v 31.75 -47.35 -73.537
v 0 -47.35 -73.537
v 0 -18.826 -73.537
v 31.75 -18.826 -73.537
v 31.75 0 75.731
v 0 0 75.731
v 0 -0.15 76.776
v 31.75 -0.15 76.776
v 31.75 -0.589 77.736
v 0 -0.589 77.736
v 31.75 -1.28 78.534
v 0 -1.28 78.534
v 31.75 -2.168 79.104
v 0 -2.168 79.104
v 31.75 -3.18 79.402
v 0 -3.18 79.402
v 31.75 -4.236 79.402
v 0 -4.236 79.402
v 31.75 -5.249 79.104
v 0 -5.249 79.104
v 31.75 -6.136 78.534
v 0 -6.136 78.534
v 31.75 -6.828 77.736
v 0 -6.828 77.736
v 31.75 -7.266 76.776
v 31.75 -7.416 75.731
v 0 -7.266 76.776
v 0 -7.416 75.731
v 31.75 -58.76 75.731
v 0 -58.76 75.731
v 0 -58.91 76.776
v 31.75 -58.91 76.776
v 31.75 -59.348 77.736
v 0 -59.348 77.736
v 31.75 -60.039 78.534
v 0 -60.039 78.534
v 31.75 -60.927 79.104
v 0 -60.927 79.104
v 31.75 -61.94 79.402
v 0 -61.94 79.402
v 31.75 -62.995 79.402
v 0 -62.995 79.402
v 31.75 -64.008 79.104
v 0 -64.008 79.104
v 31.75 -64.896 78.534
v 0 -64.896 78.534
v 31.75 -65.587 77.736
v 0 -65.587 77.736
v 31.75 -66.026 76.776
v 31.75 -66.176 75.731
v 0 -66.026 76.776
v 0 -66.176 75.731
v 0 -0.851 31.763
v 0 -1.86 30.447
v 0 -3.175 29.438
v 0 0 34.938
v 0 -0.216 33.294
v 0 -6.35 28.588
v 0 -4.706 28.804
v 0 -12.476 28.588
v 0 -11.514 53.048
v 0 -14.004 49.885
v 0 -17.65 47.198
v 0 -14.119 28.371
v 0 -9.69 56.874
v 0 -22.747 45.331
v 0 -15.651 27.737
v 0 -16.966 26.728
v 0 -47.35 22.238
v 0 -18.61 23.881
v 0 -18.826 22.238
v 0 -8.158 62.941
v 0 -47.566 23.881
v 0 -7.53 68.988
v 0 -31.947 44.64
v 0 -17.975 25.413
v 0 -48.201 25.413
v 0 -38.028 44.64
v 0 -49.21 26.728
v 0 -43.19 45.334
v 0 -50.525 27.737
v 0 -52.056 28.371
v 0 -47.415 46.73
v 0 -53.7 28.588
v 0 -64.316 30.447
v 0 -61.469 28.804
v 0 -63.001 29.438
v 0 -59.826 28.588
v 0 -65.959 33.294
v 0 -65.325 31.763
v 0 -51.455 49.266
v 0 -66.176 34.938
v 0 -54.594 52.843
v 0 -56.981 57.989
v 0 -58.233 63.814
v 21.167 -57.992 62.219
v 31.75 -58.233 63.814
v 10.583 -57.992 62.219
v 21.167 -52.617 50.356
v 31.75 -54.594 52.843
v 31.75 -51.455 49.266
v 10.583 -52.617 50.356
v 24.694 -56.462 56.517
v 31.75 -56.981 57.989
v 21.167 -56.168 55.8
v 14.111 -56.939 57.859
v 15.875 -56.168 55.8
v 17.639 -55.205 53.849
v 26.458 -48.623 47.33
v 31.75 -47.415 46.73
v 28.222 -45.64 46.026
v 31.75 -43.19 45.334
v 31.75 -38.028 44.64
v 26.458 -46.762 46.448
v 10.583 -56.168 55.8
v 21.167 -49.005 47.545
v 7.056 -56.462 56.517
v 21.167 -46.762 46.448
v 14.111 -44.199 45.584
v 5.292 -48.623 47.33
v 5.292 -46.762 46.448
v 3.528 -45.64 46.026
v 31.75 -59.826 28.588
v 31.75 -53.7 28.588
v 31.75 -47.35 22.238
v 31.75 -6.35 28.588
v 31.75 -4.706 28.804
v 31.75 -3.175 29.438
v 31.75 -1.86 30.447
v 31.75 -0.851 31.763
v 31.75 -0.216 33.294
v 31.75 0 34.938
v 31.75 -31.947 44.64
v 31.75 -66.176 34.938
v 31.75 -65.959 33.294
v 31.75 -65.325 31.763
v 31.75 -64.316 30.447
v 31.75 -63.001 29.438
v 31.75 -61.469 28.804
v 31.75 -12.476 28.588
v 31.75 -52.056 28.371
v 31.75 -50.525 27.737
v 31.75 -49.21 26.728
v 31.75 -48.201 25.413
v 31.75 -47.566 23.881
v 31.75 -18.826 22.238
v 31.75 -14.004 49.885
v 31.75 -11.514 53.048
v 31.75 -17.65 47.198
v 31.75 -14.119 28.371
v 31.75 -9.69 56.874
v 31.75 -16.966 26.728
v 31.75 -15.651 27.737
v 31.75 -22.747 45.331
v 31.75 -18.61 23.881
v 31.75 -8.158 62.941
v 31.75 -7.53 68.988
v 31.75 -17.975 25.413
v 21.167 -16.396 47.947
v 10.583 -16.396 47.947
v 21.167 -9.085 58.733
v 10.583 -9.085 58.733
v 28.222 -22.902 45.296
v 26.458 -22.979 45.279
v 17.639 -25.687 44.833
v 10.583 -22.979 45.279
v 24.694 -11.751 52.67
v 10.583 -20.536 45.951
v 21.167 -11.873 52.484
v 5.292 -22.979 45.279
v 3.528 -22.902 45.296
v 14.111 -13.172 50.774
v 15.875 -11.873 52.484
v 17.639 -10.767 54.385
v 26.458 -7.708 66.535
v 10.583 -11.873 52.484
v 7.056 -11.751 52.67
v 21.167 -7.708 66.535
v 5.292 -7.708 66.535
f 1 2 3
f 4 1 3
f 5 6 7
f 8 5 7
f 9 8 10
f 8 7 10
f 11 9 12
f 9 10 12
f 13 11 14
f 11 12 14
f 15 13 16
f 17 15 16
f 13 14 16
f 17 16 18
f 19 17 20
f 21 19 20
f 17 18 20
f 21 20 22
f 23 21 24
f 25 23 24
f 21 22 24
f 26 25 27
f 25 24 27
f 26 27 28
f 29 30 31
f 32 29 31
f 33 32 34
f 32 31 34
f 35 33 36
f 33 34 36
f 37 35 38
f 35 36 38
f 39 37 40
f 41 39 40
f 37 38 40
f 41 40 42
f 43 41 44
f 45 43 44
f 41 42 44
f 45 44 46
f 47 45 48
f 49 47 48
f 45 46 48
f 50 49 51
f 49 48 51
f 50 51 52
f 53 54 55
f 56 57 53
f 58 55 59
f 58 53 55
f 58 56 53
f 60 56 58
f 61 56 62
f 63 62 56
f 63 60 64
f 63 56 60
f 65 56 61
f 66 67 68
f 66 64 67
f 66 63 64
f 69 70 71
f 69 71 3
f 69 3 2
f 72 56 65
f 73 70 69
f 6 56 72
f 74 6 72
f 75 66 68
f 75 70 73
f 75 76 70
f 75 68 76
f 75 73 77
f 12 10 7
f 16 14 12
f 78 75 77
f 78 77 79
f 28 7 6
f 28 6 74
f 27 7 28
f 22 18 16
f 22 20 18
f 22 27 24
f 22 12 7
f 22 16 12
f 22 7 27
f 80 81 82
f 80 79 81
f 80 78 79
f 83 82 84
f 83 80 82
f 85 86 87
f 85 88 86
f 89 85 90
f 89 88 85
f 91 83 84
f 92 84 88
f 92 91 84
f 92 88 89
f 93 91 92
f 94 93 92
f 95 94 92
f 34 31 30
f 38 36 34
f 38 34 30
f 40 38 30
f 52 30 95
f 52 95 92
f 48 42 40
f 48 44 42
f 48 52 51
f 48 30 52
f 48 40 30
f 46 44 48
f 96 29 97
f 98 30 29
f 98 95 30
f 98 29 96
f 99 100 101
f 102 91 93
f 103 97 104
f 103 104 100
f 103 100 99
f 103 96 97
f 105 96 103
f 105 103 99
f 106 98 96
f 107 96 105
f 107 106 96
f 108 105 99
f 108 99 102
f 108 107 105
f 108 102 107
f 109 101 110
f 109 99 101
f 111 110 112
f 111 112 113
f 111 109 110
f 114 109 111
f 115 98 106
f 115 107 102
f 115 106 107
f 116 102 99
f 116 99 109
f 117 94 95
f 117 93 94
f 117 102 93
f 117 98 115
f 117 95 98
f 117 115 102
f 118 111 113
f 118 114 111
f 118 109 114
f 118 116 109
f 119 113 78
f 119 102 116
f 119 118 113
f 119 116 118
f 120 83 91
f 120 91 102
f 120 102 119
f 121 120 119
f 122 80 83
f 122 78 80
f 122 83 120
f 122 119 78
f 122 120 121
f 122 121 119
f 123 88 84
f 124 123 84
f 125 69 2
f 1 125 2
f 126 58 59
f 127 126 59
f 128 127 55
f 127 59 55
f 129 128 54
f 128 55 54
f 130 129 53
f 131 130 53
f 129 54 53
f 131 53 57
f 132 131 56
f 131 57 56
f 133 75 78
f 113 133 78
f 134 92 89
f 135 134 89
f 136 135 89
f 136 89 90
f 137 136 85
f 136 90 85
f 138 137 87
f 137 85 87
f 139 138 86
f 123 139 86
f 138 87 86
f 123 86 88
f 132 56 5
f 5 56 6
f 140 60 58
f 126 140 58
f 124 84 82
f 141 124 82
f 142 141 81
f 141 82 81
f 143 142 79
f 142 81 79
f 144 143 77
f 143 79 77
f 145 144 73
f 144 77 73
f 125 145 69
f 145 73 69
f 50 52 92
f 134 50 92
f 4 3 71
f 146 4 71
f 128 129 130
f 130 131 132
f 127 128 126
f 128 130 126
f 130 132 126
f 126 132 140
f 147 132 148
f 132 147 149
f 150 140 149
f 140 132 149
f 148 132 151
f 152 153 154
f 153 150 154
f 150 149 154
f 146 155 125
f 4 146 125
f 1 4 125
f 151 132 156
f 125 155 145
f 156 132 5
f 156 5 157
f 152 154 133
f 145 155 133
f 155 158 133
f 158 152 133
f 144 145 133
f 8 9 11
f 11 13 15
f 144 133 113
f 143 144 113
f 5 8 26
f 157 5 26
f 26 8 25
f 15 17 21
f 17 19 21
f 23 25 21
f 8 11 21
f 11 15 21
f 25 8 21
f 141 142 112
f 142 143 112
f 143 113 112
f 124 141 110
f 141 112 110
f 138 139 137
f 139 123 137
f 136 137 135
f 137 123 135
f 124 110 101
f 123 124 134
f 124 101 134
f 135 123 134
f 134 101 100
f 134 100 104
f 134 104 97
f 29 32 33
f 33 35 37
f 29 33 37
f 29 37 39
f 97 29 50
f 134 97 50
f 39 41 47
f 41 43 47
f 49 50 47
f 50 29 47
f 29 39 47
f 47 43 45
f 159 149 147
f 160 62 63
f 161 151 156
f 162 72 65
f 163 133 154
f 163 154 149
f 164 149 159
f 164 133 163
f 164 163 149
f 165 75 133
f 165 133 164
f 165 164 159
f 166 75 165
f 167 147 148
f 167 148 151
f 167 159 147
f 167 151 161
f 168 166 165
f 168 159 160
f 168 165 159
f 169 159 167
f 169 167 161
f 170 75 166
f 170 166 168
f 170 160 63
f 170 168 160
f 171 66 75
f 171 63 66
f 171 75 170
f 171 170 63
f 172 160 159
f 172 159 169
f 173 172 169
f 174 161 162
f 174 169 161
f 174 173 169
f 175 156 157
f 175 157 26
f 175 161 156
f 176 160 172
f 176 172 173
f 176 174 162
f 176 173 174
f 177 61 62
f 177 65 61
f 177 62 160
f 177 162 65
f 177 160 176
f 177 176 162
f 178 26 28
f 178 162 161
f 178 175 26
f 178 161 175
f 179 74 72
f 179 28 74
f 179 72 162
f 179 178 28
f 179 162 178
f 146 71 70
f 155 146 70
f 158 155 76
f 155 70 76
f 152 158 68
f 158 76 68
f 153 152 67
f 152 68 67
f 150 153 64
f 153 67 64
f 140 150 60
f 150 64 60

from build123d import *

# Parameters (mm, degrees)
F1_DEPTH = 31.75


with BuildPart() as f1:
    # F0 (on Right) → F1 (new body)
    with BuildSketch(Plane.YZ):
        with BuildLine():
            add(Edge.make_bspline(
                [(-31.946953, 44.640161), (-11.409624, 43.78444), (-7.131016, 56.049787), (-7.416258, 75.731389)],
                knots=[0, 0, 0, 0, 39.603276, 39.603276, 39.603276, 39.603276], degree=3))
            Line((-31.946953, 44.640161), (-38.027544, 44.640161))
            add(Edge.make_bspline(
                [(-58.759574, 75.731389), (-58.759574, 62.895566), (-58.759574, 45.781121), (-38.027544, 44.640161)],
                knots=[0, 0, 0, 0, 37.369527, 37.369527, 37.369527, 37.369527], degree=3))
            ThreePointArc((-58.759574, 75.731389), (-62.4677, 79.439515), (-66.175826, 75.731389))
            Line((-66.175826, 75.731389), (-66.175826, 34.93752))
            ThreePointArc((-66.175826, 34.93752), (-64.315954, 30.447392), (-59.825826, 28.58752))
            Line((-59.825826, 28.58752), (-53.699948, 28.58752))
            ThreePointArc((-53.699948, 28.58752), (-49.20982, 26.727648), (-47.349948, 22.23752))
            Line((-47.349948, 22.23752), (-47.349948, -73.536955))
            Line((-47.349948, -73.536955), (-18.825883, -73.536955))
            Line((-18.825883, -73.536955), (-18.825883, 22.23752))
            ThreePointArc((-18.825883, 22.23752), (-16.966011, 26.727648), (-12.475883, 28.58752))
            Line((-12.475883, 28.58752), (-6.35, 28.58752))
            ThreePointArc((-6.35, 28.58752), (-1.859872, 30.447392), (0, 34.93752))
            Line((0, 34.93752), (0, 75.731389))
            ThreePointArc((0, 75.731389), (-3.708129, 79.439518), (-7.416258, 75.731389))
        make_face()
    extrude(amount=F1_DEPTH)


solid = f1.part
